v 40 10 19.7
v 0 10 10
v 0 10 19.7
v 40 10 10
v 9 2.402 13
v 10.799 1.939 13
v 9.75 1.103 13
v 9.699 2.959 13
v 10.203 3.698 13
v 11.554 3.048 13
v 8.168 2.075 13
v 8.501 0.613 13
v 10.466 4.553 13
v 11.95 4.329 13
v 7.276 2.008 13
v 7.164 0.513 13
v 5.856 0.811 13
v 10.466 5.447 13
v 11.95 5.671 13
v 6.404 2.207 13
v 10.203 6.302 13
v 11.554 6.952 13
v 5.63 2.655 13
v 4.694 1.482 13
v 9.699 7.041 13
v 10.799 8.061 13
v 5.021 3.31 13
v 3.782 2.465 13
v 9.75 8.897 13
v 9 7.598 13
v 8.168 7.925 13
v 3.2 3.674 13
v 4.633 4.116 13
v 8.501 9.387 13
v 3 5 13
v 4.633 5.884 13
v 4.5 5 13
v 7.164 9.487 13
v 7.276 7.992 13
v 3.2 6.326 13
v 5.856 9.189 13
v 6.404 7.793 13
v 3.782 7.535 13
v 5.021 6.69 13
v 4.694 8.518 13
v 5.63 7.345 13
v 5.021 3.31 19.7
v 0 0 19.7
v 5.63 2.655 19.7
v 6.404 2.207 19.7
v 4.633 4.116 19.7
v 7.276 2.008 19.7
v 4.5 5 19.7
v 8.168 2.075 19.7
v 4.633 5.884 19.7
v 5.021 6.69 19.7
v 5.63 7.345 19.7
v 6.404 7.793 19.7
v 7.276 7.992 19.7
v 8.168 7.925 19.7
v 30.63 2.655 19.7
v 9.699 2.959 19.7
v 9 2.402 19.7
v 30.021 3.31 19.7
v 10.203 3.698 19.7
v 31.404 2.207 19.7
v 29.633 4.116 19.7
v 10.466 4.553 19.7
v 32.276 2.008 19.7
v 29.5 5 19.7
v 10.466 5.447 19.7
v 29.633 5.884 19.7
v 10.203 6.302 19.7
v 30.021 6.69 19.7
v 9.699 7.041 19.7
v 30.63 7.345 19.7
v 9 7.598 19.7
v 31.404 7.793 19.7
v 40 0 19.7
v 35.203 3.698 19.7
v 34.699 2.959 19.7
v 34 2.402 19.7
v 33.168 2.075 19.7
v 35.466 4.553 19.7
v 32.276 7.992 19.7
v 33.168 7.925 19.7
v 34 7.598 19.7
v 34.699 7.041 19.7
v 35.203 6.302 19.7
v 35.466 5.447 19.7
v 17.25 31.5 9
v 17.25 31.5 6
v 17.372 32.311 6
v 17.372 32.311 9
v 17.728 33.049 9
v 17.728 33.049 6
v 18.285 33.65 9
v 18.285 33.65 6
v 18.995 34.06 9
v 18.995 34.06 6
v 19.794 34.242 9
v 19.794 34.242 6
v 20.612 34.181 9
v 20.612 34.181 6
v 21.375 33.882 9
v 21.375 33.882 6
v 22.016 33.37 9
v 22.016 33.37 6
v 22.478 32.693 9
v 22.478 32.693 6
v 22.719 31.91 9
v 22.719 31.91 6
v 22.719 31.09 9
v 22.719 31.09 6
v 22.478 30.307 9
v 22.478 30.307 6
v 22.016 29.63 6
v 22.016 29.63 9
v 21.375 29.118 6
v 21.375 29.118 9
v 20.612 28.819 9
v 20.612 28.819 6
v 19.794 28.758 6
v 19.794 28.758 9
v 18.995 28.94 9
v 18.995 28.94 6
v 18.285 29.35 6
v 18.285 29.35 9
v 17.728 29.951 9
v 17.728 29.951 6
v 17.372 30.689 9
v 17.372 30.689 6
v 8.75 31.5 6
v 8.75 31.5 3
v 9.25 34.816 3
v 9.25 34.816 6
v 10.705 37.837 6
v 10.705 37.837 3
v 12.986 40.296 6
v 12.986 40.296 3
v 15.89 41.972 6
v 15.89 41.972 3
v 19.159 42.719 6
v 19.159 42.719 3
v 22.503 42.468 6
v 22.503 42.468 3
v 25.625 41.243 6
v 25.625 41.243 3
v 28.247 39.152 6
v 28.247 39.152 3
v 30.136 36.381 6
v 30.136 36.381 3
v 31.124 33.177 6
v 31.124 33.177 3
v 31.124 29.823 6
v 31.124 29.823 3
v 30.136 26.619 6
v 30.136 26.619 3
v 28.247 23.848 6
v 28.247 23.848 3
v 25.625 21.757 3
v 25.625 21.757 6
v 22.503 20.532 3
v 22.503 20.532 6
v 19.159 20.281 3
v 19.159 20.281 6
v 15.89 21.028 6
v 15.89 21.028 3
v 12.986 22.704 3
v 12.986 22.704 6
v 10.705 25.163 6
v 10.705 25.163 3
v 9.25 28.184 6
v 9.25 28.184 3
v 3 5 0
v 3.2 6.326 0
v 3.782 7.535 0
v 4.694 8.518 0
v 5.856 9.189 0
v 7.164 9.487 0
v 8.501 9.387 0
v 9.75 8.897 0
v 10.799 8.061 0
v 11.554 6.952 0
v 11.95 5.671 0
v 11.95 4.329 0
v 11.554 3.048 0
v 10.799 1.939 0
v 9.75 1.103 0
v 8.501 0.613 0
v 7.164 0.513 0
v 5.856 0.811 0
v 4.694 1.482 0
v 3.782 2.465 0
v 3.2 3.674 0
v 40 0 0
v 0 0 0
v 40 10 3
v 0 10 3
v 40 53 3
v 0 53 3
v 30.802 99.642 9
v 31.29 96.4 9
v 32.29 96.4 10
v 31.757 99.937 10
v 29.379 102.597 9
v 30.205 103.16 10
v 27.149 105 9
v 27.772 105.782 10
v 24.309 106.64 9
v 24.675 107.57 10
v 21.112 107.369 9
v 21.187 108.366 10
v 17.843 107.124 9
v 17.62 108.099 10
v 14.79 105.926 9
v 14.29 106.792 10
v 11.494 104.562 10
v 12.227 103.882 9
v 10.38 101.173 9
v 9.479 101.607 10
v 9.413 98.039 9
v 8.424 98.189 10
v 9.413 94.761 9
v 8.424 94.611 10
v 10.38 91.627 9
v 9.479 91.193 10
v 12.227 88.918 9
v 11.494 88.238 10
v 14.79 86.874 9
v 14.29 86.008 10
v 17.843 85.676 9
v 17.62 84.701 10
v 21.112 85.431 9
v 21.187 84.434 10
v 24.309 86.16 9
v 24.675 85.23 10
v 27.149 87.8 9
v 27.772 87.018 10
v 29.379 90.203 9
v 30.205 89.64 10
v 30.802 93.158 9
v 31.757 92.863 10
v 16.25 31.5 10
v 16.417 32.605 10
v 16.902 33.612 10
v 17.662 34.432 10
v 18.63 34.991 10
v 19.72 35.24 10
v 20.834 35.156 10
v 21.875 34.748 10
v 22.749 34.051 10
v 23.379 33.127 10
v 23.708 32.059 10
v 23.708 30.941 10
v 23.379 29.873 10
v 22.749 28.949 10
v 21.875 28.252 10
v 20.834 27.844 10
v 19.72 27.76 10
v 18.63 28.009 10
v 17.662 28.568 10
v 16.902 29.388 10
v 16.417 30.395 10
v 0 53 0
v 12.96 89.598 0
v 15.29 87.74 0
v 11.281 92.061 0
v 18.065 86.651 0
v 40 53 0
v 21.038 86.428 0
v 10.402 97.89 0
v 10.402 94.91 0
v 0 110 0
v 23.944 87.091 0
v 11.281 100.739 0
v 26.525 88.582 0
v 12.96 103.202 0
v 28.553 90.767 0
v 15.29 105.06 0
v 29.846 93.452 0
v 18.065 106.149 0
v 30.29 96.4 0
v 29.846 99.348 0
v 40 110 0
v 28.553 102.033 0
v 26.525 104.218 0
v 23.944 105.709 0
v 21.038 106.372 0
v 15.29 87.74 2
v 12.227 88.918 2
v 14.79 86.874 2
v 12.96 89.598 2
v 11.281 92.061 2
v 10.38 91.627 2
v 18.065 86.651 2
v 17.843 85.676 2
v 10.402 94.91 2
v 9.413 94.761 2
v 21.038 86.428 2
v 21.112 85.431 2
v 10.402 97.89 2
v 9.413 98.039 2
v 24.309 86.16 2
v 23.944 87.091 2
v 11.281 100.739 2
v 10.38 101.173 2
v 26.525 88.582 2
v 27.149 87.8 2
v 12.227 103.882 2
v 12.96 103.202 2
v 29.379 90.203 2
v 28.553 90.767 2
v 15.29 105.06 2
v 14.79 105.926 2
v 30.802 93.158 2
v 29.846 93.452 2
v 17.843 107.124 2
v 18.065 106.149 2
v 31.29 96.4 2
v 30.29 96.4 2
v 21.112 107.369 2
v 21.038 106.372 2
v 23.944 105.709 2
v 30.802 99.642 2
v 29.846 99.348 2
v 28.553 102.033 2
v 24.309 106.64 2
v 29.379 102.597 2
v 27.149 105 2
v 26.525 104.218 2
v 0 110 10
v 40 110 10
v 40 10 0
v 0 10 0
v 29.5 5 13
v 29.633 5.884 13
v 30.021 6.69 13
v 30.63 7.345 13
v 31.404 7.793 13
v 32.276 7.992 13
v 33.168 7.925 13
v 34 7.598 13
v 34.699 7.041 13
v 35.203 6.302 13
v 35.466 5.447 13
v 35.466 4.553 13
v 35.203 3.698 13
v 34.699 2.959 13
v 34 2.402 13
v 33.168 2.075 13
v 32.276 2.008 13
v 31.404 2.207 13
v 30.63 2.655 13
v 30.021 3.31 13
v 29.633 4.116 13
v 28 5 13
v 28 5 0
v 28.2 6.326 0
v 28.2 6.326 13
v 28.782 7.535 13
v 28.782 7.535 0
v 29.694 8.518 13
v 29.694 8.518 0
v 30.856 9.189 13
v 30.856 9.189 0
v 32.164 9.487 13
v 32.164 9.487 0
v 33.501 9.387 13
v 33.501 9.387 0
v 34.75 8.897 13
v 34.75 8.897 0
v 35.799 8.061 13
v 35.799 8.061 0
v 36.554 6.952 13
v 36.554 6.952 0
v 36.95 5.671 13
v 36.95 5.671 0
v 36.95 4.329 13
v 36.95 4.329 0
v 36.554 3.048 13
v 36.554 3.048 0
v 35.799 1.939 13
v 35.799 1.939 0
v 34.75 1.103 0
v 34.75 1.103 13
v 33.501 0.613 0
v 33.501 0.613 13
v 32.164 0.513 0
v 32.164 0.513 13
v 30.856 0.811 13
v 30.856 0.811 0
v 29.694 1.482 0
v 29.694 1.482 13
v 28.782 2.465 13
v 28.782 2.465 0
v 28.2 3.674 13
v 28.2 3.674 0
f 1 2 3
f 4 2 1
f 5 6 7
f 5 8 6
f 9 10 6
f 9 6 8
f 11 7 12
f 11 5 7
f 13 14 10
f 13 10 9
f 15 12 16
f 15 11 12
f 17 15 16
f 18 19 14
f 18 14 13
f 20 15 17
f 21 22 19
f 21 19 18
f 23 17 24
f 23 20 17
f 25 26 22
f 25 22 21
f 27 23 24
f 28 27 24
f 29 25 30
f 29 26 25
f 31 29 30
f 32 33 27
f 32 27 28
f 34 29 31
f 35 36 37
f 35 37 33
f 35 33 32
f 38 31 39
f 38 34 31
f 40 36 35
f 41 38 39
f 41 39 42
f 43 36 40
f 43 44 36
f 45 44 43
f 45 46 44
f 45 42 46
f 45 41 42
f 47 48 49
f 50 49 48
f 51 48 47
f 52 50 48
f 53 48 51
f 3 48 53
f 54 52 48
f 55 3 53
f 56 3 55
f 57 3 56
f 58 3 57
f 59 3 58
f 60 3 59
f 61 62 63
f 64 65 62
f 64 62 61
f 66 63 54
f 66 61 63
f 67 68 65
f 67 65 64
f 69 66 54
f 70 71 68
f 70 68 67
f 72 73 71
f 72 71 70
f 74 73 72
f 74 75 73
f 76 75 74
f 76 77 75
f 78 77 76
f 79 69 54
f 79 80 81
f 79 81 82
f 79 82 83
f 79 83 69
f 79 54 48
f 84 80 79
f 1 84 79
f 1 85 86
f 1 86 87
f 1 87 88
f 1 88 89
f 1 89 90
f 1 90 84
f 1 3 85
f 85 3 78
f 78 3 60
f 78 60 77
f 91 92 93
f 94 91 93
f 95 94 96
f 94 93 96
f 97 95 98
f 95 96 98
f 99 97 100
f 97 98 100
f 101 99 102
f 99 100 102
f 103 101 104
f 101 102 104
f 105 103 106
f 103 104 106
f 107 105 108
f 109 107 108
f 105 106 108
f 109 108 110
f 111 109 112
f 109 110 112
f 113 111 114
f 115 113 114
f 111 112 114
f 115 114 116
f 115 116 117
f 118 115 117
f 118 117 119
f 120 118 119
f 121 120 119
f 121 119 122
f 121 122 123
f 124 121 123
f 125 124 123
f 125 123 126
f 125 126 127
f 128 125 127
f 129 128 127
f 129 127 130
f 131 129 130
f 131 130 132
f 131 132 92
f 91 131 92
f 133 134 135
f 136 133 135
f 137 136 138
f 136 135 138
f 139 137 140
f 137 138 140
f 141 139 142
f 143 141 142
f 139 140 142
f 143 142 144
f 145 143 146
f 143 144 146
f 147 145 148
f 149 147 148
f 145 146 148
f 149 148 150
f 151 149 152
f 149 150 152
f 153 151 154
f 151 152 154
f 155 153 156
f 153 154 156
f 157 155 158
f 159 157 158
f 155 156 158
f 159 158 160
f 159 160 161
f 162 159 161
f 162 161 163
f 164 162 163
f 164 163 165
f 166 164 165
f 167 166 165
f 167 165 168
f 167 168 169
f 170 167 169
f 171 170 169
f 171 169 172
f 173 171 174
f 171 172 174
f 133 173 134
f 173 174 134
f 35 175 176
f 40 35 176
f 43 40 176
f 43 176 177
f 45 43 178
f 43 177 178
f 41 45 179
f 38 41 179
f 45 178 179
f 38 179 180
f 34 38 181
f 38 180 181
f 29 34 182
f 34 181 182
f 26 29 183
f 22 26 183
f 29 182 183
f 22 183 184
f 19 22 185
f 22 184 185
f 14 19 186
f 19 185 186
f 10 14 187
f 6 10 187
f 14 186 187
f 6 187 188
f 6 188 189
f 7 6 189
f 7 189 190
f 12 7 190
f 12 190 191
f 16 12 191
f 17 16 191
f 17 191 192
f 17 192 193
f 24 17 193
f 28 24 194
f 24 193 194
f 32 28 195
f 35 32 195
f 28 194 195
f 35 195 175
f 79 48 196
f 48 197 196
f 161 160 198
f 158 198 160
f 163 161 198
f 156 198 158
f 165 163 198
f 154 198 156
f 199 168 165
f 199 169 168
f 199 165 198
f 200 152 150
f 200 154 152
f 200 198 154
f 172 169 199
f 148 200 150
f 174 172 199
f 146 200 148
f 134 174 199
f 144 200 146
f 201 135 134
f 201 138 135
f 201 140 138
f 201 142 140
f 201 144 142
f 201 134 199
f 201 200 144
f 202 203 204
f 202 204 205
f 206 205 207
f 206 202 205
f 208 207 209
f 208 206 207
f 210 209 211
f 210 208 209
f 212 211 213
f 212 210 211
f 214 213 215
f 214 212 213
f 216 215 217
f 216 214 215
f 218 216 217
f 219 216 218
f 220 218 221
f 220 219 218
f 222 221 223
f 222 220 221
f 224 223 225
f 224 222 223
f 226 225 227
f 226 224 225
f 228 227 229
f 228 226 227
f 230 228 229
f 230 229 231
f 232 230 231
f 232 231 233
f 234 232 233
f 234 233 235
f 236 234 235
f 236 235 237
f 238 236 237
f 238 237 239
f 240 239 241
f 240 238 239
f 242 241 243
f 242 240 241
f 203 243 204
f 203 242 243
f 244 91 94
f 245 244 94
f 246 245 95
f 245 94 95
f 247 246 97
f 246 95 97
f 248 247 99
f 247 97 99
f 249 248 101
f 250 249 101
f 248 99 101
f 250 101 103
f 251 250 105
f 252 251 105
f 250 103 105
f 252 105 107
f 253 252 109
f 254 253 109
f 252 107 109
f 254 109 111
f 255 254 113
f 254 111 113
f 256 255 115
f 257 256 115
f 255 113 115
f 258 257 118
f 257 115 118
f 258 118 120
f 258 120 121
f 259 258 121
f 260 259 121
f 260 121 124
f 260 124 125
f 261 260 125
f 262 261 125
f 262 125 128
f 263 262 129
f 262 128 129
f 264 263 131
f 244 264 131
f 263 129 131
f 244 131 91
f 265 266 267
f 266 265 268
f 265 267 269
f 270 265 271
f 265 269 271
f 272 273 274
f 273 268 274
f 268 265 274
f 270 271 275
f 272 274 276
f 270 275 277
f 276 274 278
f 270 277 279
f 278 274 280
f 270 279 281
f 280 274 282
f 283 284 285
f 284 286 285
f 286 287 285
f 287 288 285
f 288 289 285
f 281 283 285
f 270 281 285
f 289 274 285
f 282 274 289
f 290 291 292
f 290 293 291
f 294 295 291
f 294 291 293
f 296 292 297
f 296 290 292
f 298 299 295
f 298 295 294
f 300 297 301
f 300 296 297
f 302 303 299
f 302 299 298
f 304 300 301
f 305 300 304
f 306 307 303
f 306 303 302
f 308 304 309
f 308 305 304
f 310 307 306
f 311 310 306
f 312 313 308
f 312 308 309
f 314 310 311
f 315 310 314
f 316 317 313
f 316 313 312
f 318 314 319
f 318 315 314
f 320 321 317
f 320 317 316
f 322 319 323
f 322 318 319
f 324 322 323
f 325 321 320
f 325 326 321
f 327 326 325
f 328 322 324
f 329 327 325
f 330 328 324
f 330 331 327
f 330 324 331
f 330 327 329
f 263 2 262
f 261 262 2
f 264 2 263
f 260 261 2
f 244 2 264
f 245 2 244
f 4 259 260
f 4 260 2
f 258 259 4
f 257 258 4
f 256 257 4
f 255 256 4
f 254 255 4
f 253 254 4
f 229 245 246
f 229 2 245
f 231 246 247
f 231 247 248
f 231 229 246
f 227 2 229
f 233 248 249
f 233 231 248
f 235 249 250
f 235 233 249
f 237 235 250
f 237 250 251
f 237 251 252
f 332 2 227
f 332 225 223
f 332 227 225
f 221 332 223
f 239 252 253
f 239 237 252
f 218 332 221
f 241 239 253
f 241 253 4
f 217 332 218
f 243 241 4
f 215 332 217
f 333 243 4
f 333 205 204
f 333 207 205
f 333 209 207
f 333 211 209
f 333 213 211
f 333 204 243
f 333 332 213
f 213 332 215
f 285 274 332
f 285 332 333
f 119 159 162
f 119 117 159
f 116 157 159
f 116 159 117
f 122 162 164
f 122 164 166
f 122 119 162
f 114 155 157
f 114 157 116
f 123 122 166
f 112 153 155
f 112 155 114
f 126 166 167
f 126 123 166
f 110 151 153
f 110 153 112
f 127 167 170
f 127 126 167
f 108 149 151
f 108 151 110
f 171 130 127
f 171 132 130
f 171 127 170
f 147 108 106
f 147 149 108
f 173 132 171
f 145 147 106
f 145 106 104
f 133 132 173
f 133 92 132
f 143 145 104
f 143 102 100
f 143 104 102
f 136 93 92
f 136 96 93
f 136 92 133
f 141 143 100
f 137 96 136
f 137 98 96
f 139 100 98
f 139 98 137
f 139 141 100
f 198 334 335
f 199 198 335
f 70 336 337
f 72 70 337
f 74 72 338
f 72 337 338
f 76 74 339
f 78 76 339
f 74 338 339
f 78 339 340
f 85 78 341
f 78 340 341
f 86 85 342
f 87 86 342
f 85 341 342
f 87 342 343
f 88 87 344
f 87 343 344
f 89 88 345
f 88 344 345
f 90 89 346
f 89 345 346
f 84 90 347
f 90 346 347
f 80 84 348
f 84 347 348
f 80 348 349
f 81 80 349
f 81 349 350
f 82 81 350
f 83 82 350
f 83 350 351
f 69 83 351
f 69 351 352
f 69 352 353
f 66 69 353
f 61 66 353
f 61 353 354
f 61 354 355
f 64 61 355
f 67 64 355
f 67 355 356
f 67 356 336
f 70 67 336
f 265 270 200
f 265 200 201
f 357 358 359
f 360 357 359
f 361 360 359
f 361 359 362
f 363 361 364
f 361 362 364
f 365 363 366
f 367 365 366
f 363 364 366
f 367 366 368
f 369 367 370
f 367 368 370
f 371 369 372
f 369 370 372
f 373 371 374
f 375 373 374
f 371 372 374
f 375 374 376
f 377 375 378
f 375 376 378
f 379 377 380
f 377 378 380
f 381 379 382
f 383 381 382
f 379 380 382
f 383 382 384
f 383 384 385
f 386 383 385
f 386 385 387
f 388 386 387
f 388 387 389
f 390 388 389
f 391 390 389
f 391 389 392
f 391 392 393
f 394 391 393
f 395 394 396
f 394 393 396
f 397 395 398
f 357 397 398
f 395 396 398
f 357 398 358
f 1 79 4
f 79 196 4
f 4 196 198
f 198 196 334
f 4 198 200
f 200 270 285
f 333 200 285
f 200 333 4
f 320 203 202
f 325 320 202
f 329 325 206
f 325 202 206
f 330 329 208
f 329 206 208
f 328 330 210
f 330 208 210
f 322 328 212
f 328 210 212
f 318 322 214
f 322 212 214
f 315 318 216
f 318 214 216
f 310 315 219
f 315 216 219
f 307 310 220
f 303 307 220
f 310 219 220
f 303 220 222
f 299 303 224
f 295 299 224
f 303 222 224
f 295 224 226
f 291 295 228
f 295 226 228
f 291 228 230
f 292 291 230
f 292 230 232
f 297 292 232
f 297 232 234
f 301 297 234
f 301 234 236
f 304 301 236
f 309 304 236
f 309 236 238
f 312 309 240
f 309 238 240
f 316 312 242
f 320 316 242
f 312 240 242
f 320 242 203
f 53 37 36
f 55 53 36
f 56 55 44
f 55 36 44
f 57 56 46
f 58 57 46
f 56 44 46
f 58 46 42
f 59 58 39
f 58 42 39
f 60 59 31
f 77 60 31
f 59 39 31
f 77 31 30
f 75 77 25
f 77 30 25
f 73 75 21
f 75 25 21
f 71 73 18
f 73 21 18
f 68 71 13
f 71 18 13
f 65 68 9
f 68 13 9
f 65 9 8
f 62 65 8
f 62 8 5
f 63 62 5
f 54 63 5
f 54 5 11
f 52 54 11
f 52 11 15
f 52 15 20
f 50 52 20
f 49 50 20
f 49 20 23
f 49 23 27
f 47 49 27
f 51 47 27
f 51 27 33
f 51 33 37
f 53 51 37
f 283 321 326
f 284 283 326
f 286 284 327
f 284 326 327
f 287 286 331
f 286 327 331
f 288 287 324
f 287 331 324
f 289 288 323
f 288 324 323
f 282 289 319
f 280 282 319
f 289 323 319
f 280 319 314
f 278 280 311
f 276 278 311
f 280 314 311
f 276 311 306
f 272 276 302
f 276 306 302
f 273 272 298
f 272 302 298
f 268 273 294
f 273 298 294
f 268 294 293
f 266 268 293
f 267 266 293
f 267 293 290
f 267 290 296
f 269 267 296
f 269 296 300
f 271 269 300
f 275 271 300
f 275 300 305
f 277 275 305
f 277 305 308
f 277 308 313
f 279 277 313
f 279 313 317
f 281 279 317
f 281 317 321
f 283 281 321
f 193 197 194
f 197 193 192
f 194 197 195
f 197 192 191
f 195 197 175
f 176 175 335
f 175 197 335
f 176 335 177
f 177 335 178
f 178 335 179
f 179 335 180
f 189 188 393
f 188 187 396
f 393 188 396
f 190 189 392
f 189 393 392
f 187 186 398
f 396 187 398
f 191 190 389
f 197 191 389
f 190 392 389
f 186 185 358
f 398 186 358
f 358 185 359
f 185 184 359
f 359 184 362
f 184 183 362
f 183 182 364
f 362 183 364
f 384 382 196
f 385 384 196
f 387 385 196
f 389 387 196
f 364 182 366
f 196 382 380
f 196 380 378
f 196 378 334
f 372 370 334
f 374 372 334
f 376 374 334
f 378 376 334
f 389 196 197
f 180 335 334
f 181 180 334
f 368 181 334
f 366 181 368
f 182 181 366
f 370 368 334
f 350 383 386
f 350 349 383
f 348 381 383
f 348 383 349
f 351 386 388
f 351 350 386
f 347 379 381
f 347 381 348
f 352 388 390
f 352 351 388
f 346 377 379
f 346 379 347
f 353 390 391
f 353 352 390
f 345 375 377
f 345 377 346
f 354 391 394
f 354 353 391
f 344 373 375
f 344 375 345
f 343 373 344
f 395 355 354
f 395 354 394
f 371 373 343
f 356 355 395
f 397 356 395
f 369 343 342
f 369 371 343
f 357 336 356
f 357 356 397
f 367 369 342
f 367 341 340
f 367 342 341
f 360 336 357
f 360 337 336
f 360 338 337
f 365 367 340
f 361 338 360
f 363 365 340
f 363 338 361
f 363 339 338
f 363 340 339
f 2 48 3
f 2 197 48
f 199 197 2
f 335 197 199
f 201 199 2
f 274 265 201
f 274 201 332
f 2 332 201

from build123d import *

# Parameters (mm, degrees)
SKIZZE1_W                       = 40
SKIZZE1_H                       = 110
AUFSATZ_LINEAR_AUSTRAGEN1_DEPTH = 10
SKIZZE2_W                       = 40
SKIZZE2_H                       = 43
SCHNITT_LINEAR_AUSTRAGEN1_DEPTH = 3
SKIZZE3_R                       = 2.75
SCHNITT_LINEAR_AUSTRAGEN2_DEPTH = 11
SKIZZE5_R                       = 11
SCHNITT_LINEAR_AUSTRAGEN4_DEPTH = 8
SKIZZE6_R                       = 10
SCHNITT_LINEAR_AUSTRAGEN5_DEPTH = 8
FASE1_SIZE                      = 1
SKIZZE10_W                      = 40
SKIZZE10_H                      = 10
AUFSATZ_LINEAR_AUSTRAGEN2_DEPTH = 9.7
SKIZZE11_R                      = 3
SCHNITT_LINEAR_AUSTRAGEN6_DEPTH = 21
SKIZZE12_R                      = 4.5
SCHNITT_LINEAR_AUSTRAGEN7_DEPTH = 13
SKIZZE13_R                      = 11.25
SCHNITT_LINEAR_AUSTRAGEN8_DEPTH = 3


with BuildPart() as part:
    # Skizze1 → Aufsatz-Linear austragen1 (new body)
    with BuildSketch(Plane.XY):
        with Locations((20, 55)):
            Rectangle(SKIZZE1_W, SKIZZE1_H)
    extrude(amount=AUFSATZ_LINEAR_AUSTRAGEN1_DEPTH)

    # Skizze2 → Schnitt-Linear austragen1 (cut)
    with BuildSketch(Plane(origin=(0, 0, 0), x_dir=(-1, 0, 0), z_dir=(0, 0, -1))):
        with Locations((-20, 31.5)):
            Rectangle(SKIZZE2_W, SKIZZE2_H)
    extrude(amount=-SCHNITT_LINEAR_AUSTRAGEN1_DEPTH, mode=Mode.SUBTRACT)

    # Skizze3 → Schnitt-Linear austragen2 (cut)
    with BuildSketch(Plane(origin=(0, 0, 3), x_dir=(-1, 0, 0), z_dir=(0, 0, -1))):
        with Locations((-20, 31.5)):
            Circle(SKIZZE3_R)
    extrude(amount=-SCHNITT_LINEAR_AUSTRAGEN2_DEPTH, mode=Mode.SUBTRACT)

    # Skizze5 → Schnitt-Linear austragen4 (cut)
    with BuildSketch(Plane.XY.offset(10)):
        with Locations((20.290455997, 96.4)):
            Circle(SKIZZE5_R)
    extrude(amount=-SCHNITT_LINEAR_AUSTRAGEN4_DEPTH, mode=Mode.SUBTRACT)

    # Skizze6 → Schnitt-Linear austragen5 (cut)
    with BuildSketch(Plane.XY.offset(2)):
        with Locations((20.290455997, 96.4)):
            Circle(SKIZZE6_R)
    extrude(amount=-SCHNITT_LINEAR_AUSTRAGEN5_DEPTH, mode=Mode.SUBTRACT)

    # Fase1
    fase1_edges = [part.edges().sort_by_distance(p)[0] for p in [
        (22.75, 31.5, 10),
        (9.290455997, 96.4, 10),
    ]]
    chamfer(fase1_edges, length=FASE1_SIZE)

    # Skizze10 → Aufsatz-Linear austragen2 (add)
    with BuildSketch(Plane.XY.offset(10)):
        with Locations((20, 5)):
            Rectangle(SKIZZE10_W, SKIZZE10_H)
    extrude(amount=AUFSATZ_LINEAR_AUSTRAGEN2_DEPTH)

    # Skizze11 → Schnitt-Linear austragen6 (cut)
    with BuildSketch(Plane(origin=(0, 0, 0), x_dir=(-1, 0, 0), z_dir=(0, 0, -1))):
        with Locations((-32.5, 5)):
            Circle(SKIZZE11_R)
        with Locations((-7.5, 5)):
            Circle(SKIZZE11_R)
    extrude(amount=-SCHNITT_LINEAR_AUSTRAGEN6_DEPTH, mode=Mode.SUBTRACT)

    # Skizze12 → Schnitt-Linear austragen7 (cut)
    with BuildSketch(Plane(origin=(0, 0, 0), x_dir=(-1, 0, 0), z_dir=(0, 0, -1))):
        with Locations((-32.5, 5)):
            Circle(SKIZZE12_R)
        with Locations((-7.5, 5)):
            Circle(SKIZZE12_R)
    extrude(amount=-SCHNITT_LINEAR_AUSTRAGEN7_DEPTH, mode=Mode.SUBTRACT)

    # Skizze13 → Schnitt-Linear austragen8 (cut)
    with BuildSketch(Plane(origin=(0, 0, 3), x_dir=(-1, 0, 0), z_dir=(0, 0, -1))):
        with Locations((-20, 31.5)):
            Circle(SKIZZE13_R)
    extrude(amount=-SCHNITT_LINEAR_AUSTRAGEN8_DEPTH, mode=Mode.SUBTRACT)


solid = part.part
